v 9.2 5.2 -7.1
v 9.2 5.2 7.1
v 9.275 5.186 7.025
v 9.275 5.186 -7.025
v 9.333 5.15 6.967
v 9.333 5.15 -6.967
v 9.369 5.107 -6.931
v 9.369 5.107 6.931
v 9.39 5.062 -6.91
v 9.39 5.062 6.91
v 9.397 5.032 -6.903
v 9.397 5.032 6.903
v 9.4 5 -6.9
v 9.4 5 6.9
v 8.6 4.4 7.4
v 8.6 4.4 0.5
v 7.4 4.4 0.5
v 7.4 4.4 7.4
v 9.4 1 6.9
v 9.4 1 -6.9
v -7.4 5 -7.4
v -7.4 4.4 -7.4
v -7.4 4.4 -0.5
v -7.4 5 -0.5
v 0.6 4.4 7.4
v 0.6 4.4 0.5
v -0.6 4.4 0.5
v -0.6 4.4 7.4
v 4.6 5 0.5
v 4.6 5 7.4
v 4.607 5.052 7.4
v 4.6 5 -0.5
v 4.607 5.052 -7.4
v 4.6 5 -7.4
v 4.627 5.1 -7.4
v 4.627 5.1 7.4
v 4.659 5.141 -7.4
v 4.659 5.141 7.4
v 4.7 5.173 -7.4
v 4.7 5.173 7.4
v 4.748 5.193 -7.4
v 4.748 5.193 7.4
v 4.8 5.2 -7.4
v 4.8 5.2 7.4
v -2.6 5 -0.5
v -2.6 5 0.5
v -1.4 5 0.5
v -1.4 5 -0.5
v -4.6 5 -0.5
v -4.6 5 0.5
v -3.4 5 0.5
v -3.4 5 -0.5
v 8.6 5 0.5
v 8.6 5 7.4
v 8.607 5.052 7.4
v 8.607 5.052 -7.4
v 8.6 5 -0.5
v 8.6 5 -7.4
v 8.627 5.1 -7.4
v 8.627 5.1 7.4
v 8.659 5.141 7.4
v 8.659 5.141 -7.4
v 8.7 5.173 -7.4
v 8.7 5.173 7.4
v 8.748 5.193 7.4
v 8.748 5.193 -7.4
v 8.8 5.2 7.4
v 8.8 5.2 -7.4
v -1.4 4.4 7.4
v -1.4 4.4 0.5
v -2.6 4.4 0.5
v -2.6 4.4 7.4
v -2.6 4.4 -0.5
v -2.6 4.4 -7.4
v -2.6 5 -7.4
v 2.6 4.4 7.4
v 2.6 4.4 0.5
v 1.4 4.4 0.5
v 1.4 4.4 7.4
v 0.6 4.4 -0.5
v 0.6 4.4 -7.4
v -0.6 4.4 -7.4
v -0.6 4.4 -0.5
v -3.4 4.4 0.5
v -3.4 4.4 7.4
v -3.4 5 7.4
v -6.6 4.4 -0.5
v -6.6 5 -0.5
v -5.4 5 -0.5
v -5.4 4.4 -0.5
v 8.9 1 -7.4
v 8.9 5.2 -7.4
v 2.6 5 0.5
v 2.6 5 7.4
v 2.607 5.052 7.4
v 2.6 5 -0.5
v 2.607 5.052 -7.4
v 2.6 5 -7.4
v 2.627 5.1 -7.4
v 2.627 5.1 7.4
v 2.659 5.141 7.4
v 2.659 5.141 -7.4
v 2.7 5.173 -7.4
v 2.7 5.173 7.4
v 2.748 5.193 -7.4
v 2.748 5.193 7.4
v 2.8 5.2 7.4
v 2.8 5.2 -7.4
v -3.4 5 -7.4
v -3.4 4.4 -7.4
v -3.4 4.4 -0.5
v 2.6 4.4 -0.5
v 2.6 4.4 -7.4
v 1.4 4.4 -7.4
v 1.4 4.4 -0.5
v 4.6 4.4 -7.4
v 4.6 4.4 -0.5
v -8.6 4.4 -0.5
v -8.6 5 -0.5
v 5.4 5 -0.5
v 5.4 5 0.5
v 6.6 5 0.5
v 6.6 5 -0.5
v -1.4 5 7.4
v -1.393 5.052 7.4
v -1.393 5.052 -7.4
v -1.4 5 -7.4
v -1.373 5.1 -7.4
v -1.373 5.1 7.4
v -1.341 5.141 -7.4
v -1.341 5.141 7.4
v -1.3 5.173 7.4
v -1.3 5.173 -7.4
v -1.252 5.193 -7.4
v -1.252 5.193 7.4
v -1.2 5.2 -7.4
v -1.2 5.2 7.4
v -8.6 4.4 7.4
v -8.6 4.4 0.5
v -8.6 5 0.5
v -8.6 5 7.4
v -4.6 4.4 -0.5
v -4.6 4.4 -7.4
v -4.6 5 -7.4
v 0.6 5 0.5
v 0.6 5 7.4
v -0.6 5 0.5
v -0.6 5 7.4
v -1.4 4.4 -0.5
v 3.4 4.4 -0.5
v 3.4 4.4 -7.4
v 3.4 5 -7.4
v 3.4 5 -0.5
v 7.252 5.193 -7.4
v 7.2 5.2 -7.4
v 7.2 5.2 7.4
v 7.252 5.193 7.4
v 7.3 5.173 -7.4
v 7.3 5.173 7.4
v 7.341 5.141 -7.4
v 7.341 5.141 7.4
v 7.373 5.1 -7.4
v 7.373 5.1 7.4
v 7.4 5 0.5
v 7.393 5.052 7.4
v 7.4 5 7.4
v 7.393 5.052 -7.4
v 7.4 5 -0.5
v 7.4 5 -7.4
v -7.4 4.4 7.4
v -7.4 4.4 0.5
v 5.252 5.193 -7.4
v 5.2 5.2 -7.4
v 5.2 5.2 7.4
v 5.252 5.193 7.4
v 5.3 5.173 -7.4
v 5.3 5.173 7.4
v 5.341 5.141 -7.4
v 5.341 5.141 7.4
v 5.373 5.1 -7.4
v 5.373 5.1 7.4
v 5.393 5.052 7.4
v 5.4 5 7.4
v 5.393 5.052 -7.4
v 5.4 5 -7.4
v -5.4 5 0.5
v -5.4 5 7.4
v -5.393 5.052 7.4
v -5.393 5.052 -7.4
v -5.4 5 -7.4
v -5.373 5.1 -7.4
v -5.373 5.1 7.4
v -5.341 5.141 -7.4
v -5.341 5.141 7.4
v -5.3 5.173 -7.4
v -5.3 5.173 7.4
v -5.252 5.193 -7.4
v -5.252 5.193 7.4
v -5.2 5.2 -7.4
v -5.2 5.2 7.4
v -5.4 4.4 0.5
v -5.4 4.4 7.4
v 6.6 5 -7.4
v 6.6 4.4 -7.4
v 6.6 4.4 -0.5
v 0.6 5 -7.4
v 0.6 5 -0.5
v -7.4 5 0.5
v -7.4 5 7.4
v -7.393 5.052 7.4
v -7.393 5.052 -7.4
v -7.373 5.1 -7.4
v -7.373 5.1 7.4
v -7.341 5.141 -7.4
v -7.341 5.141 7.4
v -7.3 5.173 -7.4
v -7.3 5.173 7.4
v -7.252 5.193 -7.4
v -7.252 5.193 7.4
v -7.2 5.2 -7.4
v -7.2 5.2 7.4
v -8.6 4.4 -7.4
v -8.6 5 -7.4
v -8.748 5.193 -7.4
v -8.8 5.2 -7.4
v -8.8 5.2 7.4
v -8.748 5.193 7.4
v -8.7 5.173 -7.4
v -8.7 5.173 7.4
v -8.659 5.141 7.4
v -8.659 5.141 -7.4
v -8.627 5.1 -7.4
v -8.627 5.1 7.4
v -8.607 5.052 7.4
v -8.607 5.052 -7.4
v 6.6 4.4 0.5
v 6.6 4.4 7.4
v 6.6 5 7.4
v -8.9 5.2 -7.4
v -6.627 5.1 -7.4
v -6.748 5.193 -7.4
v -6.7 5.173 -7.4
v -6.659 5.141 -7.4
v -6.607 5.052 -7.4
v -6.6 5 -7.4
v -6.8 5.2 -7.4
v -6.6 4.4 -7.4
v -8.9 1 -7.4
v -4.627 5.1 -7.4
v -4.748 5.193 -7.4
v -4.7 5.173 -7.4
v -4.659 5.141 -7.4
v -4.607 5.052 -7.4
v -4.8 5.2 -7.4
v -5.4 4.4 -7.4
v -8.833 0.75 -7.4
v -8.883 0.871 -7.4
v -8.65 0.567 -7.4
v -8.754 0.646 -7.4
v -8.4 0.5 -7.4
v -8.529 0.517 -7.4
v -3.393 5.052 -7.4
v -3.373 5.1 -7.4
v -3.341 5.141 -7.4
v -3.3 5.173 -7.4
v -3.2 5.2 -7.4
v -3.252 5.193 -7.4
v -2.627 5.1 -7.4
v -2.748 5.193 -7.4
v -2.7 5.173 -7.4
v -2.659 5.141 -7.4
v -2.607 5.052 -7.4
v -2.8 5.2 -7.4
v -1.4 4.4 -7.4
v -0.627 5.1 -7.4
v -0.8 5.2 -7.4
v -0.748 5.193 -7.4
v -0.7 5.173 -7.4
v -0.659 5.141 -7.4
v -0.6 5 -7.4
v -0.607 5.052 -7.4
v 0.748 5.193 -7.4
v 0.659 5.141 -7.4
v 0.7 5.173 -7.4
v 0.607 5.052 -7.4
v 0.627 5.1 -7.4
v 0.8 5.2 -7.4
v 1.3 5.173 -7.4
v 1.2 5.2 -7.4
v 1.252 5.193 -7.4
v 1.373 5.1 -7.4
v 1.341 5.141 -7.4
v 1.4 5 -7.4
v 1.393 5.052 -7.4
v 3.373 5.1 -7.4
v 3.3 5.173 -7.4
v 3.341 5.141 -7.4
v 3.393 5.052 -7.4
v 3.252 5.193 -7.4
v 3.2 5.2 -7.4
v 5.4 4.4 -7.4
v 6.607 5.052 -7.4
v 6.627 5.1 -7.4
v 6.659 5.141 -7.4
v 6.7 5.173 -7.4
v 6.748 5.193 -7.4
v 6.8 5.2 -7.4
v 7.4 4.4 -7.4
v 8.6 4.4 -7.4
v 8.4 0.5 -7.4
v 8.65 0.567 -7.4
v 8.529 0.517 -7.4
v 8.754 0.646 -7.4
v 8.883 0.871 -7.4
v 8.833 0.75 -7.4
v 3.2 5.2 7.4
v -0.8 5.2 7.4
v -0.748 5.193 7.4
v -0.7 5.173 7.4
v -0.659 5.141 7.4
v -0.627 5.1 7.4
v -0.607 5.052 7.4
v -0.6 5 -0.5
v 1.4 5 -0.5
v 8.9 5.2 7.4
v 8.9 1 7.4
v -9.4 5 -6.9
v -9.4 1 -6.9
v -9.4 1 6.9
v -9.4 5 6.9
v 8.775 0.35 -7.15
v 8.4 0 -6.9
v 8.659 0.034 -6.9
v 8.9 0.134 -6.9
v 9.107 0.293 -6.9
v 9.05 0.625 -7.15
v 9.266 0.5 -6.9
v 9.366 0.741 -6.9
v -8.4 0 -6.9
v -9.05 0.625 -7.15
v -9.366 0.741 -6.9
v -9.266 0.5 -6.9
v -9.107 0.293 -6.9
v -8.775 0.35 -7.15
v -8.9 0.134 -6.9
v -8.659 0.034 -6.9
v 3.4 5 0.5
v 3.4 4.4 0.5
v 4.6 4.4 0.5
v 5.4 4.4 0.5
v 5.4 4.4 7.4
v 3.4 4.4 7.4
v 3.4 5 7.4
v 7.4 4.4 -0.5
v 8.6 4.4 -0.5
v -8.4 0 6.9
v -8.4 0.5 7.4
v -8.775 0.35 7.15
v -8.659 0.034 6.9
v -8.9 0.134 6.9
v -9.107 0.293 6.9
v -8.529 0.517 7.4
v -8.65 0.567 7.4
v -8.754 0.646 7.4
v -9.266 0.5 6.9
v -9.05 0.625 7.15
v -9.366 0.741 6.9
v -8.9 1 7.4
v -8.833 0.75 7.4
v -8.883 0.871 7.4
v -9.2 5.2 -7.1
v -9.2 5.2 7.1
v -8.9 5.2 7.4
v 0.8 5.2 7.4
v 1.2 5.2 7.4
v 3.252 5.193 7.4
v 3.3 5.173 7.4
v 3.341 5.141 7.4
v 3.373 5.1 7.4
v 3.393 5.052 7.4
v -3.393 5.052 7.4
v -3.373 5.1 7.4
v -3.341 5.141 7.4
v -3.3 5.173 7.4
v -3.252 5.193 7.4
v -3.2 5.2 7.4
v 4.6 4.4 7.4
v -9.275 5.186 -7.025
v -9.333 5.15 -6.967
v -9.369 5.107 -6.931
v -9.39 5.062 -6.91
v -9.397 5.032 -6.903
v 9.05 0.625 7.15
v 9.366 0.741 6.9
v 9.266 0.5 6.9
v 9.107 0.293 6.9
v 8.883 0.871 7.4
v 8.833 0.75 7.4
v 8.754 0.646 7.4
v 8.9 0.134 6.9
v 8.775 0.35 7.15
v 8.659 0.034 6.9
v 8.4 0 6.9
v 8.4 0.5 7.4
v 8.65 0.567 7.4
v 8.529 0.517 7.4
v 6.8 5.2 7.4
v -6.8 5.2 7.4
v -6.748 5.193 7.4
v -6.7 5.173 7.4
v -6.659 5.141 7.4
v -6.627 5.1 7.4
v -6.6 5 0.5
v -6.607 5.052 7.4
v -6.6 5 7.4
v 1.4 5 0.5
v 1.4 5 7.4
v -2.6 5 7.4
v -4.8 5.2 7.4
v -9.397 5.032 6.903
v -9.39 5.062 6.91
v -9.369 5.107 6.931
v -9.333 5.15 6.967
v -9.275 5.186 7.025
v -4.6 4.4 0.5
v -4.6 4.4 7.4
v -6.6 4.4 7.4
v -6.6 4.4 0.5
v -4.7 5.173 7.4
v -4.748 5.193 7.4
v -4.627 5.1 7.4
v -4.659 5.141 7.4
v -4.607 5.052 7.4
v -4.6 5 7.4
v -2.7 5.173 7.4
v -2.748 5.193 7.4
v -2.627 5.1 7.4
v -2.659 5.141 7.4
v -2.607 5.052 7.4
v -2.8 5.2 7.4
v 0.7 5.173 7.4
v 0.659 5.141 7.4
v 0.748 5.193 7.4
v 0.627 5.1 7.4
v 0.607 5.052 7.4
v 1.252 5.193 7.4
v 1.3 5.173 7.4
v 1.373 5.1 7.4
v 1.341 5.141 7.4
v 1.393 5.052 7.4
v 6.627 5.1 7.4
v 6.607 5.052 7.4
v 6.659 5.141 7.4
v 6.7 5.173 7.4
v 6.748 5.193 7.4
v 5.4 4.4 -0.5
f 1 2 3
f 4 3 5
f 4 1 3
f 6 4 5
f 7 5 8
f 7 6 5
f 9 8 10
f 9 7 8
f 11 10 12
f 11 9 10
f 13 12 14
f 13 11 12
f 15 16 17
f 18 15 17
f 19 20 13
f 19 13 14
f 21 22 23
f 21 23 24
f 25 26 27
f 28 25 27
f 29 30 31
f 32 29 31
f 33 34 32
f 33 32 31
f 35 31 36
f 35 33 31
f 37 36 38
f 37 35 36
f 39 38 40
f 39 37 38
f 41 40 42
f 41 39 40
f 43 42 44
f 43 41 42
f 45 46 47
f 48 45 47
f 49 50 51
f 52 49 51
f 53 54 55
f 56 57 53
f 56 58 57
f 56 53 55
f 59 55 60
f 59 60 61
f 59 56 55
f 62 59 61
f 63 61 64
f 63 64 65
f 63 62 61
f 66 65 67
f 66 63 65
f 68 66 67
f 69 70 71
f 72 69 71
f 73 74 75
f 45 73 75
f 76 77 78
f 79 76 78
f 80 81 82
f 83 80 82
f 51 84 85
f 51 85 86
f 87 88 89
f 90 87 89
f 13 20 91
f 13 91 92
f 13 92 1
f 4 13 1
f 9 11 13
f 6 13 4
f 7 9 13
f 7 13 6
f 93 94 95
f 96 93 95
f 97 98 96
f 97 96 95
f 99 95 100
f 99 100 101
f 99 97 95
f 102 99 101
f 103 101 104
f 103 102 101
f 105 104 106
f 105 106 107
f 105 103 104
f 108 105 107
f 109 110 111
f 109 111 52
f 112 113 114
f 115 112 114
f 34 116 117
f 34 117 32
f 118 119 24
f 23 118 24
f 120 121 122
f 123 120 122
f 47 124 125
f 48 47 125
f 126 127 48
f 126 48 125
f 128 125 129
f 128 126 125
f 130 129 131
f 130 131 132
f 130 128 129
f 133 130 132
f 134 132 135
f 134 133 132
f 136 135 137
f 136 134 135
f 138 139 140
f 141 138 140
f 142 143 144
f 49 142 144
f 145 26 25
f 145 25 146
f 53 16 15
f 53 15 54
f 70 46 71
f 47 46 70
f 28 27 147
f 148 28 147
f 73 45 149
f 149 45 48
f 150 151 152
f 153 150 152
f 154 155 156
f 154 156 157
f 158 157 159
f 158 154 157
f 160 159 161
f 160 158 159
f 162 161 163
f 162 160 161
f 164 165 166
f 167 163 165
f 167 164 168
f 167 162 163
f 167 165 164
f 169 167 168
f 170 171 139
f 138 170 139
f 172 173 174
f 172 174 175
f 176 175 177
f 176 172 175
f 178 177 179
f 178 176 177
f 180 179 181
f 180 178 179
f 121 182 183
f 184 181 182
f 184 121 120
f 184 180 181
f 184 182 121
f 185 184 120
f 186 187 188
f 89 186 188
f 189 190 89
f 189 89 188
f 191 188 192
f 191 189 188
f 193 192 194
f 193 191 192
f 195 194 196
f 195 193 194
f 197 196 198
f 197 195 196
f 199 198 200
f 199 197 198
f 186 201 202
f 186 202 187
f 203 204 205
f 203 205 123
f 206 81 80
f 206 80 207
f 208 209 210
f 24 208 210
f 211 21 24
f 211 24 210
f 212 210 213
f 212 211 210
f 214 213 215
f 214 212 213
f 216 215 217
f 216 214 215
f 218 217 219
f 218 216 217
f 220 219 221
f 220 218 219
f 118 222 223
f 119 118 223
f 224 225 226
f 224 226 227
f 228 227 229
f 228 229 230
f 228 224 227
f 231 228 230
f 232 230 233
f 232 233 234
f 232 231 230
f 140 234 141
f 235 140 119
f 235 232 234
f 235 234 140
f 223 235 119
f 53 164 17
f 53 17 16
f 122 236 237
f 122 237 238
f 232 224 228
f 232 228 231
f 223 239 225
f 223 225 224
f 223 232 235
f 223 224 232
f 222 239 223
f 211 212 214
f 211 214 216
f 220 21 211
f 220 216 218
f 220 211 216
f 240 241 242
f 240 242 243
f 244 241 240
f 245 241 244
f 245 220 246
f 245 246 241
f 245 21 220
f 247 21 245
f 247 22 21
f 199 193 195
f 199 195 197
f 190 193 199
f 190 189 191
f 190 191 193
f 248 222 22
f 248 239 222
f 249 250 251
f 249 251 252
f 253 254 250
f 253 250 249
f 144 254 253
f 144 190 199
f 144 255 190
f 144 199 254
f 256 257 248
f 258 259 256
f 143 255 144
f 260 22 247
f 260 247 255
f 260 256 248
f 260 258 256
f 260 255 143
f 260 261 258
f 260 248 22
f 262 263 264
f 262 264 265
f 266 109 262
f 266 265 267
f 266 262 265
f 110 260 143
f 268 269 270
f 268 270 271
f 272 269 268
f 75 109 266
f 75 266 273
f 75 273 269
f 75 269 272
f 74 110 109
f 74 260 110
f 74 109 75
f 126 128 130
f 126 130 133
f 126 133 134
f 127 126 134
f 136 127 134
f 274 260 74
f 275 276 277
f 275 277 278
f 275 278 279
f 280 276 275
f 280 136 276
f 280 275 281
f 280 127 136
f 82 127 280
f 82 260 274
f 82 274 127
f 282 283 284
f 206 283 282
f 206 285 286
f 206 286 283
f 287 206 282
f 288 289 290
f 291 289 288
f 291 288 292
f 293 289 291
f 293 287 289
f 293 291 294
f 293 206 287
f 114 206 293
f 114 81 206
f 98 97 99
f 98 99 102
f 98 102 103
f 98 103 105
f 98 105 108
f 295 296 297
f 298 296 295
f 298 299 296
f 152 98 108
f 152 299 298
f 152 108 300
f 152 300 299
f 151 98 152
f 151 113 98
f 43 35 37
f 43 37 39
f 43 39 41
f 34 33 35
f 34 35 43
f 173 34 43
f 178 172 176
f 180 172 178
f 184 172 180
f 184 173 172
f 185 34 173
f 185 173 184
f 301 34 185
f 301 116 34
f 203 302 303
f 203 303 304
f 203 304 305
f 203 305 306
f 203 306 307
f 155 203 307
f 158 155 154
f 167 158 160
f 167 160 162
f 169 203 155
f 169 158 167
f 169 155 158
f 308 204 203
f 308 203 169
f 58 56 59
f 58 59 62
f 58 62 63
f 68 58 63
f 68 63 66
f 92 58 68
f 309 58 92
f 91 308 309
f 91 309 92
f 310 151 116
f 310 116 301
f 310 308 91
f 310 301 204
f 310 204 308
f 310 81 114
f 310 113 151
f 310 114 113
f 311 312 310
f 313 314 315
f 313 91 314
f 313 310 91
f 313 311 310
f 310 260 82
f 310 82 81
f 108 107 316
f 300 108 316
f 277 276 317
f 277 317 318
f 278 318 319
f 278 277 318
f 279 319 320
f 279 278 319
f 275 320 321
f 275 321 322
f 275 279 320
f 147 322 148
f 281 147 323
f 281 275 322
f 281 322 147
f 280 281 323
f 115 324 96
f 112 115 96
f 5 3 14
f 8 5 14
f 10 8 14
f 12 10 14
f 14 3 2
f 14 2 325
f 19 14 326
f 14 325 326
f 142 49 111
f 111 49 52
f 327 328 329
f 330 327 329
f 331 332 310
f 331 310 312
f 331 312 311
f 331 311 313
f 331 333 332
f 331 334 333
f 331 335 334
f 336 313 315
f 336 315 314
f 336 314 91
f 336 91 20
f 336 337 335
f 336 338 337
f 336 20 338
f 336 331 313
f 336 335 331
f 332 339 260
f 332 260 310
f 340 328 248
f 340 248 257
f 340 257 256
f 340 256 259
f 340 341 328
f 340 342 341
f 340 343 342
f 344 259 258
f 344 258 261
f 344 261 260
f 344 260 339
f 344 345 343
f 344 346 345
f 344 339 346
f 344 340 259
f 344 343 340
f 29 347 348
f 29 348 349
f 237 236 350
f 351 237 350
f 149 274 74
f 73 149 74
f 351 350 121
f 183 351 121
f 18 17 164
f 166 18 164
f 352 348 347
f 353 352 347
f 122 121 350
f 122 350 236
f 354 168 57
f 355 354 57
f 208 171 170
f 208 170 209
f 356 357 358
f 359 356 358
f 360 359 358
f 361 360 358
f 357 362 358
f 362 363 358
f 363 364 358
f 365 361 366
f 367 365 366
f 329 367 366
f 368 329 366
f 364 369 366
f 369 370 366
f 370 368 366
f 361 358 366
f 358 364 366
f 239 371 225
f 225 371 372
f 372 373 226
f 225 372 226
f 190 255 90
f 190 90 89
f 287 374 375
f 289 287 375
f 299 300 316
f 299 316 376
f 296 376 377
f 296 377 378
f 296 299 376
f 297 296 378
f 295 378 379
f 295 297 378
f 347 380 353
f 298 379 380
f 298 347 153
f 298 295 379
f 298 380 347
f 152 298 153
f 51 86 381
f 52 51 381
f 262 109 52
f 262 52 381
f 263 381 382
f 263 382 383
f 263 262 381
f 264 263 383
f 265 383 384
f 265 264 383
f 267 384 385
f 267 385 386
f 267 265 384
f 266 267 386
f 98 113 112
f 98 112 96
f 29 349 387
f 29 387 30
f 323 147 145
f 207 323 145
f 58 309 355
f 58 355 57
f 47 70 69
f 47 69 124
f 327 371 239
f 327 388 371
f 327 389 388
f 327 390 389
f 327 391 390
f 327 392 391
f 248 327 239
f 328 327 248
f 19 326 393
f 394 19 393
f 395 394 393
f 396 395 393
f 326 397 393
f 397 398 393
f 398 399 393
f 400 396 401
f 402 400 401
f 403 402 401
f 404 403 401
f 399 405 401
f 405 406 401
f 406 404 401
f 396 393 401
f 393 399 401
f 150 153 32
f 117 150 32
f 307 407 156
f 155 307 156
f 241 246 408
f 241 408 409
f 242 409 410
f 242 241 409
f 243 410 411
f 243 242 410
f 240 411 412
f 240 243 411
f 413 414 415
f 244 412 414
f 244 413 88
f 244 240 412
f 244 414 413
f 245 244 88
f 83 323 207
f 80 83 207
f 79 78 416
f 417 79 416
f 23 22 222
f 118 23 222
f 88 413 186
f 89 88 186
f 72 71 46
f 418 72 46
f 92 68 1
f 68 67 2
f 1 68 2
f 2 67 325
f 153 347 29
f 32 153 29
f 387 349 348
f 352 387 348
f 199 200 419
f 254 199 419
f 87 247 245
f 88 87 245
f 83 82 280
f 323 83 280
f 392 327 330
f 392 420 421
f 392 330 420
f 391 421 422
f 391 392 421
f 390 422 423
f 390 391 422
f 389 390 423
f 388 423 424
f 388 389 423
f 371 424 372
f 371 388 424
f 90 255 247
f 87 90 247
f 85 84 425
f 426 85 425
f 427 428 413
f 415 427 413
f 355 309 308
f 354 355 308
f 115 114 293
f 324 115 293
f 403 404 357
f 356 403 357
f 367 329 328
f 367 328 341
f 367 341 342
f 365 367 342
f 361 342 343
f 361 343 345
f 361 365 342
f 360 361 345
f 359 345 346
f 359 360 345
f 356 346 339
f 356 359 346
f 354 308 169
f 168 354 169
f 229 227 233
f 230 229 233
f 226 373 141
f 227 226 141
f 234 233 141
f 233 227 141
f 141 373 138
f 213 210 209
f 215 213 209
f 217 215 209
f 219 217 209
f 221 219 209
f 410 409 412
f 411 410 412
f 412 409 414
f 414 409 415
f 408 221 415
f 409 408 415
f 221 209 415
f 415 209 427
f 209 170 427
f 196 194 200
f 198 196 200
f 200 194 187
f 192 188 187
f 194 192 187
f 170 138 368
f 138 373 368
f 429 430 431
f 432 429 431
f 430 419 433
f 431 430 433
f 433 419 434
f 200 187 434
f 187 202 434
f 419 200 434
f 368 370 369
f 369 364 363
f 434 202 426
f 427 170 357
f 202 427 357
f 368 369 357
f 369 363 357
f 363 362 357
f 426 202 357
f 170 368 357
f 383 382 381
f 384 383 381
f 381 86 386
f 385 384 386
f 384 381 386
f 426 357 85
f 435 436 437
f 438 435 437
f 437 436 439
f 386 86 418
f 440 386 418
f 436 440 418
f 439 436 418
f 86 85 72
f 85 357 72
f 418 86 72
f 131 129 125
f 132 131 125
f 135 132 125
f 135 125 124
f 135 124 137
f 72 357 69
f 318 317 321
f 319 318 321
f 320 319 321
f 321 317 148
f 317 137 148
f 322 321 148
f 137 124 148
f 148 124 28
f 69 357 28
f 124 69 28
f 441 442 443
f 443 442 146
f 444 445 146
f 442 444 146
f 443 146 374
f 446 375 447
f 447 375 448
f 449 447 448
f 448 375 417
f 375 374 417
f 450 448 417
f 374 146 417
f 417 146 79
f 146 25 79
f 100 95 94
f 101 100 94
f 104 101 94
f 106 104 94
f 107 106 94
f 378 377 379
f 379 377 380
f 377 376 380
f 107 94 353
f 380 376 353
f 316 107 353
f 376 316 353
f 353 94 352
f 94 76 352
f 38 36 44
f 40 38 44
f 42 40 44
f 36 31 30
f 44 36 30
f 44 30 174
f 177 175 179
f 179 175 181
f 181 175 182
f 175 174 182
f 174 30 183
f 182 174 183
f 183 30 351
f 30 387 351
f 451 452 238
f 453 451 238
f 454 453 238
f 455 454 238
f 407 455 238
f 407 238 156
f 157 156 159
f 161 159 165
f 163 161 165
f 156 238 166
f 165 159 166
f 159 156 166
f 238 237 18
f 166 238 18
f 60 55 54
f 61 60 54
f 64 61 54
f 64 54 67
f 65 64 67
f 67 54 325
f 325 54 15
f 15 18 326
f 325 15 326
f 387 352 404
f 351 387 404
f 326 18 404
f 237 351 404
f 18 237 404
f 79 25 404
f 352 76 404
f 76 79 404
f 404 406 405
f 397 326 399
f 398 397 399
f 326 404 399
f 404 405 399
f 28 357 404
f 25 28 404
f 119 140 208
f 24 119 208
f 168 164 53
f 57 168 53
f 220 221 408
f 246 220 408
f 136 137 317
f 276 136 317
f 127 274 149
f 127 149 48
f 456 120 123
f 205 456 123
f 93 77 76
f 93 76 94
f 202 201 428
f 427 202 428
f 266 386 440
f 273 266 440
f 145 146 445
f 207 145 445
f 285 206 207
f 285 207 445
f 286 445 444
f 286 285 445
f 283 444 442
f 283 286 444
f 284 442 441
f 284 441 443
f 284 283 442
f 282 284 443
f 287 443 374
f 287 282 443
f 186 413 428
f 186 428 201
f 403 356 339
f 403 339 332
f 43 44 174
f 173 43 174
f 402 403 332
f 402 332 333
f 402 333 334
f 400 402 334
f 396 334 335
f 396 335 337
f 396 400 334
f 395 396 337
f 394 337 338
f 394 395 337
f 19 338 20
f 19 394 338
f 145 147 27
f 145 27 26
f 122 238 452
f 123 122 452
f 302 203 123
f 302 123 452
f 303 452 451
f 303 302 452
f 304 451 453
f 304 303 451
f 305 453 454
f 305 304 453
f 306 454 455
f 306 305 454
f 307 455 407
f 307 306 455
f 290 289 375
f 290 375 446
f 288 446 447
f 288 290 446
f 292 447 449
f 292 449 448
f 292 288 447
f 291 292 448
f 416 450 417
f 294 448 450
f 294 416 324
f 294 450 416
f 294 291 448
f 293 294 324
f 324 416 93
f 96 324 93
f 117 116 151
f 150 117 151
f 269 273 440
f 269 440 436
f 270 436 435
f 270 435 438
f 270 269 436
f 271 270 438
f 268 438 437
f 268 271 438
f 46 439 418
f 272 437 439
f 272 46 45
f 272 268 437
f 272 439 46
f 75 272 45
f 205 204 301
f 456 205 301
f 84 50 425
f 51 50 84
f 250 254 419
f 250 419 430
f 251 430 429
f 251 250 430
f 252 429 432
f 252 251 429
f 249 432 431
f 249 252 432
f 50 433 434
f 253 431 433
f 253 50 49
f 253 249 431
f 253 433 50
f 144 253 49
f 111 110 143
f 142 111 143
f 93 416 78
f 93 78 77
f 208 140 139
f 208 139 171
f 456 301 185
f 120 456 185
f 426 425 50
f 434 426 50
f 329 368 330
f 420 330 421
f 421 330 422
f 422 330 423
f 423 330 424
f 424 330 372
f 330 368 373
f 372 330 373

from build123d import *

# Parameters (mm, degrees)
SKETCH1_W           = 18.8
SKETCH1_H           = 14.8
BOSS_EXTRUDE1_DEPTH = 5.2
SKETCH2_W           = 1.2
SKETCH2_H           = 0.8
CUT_EXTRUDE1_DEPTH  = 19.287700785
SKETCH3_W           = 1.2
SKETCH3_H           = 0.8
CUT_EXTRUDE2_DEPTH  = 19.287700785
SKETCH4_W           = 1.2
SKETCH4_H           = 0.8
CUT_EXTRUDE3_DEPTH  = 19.287700785
SKETCH5_W           = 1.2
SKETCH5_H           = 0.8
CUT_EXTRUDE4_DEPTH  = 19.287700785
SKETCH6_W           = 1.2
SKETCH6_H           = 0.8
CUT_EXTRUDE5_DEPTH  = 19.287700785
SKETCH7_W           = 1.2
SKETCH7_H           = 0.8
CUT_EXTRUDE6_DEPTH  = 19.287700785
SKETCH8_W           = 1.2
SKETCH8_H           = 0.8
CUT_EXTRUDE7_DEPTH  = 19.287700785
SKETCH9_W           = 1.2
SKETCH9_H           = 0.8
CUT_EXTRUDE8_DEPTH  = 19.287700785
SKETCH10_W          = 1.2
SKETCH10_H          = 0.8
CUT_EXTRUDE9_DEPTH  = 19.287700785
RIB1_REACH          = 15.045
SKETCH11_WALL_W     = 29.289078174
SKETCH11_WALL_H     = 1
RIB2_REACH          = 15.045
SKETCH12_WALL_W     = 29.289078174
SKETCH12_WALL_H     = 1
RIB3_REACH          = 15.045
SKETCH13_WALL_W     = 29.289078174
SKETCH13_WALL_H     = 1
RIB4_REACH          = 15.045
SKETCH14_WALL_W     = 29.289078174
SKETCH14_WALL_H     = 1
RIB5_REACH          = 15.045
SKETCH15_WALL_W     = 29.289078174
SKETCH15_WALL_H     = 1
RIB6_REACH          = 15.045
SKETCH16_WALL_W     = 29.289078174
SKETCH16_WALL_H     = 1
RIB7_REACH          = 15.045
SKETCH17_WALL_W     = 29.289078174
SKETCH17_WALL_H     = 1
RIB8_REACH          = 15.045
SKETCH18_WALL_W     = 29.289078174
SKETCH18_WALL_H     = 1
RIB9_REACH          = 15.045
SKETCH19_WALL_W     = 29.289078174
SKETCH19_WALL_H     = 1
FILLET1_R           = 1
CHAMFER1_SIZE       = 0.5
FILLET2_START       = -8
FILLET2_DEPTH       = 16


with BuildPart() as part:
    # Sketch1 → Boss-Extrude1 (new body)
    with BuildSketch(Plane.XZ):
        Rectangle(SKETCH1_W, SKETCH1_H)
    extrude(amount=-BOSS_EXTRUDE1_DEPTH)

    # Sketch2 → Cut-Extrude1 (cut, through all)
    with BuildSketch(Plane(origin=(0, 0, -7.4), x_dir=(-1, 0, 0), z_dir=(0, 0, -1))):
        with Locations((-8, 4.8)):
            Rectangle(SKETCH2_W, SKETCH2_H)
    extrude(amount=-CUT_EXTRUDE1_DEPTH, mode=Mode.SUBTRACT)

    # Sketch3 → Cut-Extrude2 (cut, through all)
    with BuildSketch(Plane(origin=(0, 0, -7.4), x_dir=(-1, 0, 0), z_dir=(0, 0, -1))):
        with Locations((-6, 4.8)):
            Rectangle(SKETCH3_W, SKETCH3_H)
    extrude(amount=-CUT_EXTRUDE2_DEPTH, mode=Mode.SUBTRACT)

    # Sketch4 → Cut-Extrude3 (cut, through all)
    with BuildSketch(Plane(origin=(0, 0, -7.4), x_dir=(-1, 0, 0), z_dir=(0, 0, -1))):
        with Locations((-4, 4.8)):
            Rectangle(SKETCH4_W, SKETCH4_H)
    extrude(amount=-CUT_EXTRUDE3_DEPTH, mode=Mode.SUBTRACT)

    # Sketch5 → Cut-Extrude4 (cut, through all)
    with BuildSketch(Plane(origin=(0, 0, -7.4), x_dir=(-1, 0, 0), z_dir=(0, 0, -1))):
        with Locations((-2, 4.8)):
            Rectangle(SKETCH5_W, SKETCH5_H)
    extrude(amount=-CUT_EXTRUDE4_DEPTH, mode=Mode.SUBTRACT)

    # Sketch6 → Cut-Extrude5 (cut, through all)
    with BuildSketch(Plane(origin=(0, 0, -7.4), x_dir=(-1, 0, 0), z_dir=(0, 0, -1))):
        with Locations((0, 4.8)):
            Rectangle(SKETCH6_W, SKETCH6_H)
    extrude(amount=-CUT_EXTRUDE5_DEPTH, mode=Mode.SUBTRACT)

    # Sketch7 → Cut-Extrude6 (cut, through all)
    with BuildSketch(Plane(origin=(0, 0, -7.4), x_dir=(-1, 0, 0), z_dir=(0, 0, -1))):
        with Locations((2, 4.8)):
            Rectangle(SKETCH7_W, SKETCH7_H)
    extrude(amount=-CUT_EXTRUDE6_DEPTH, mode=Mode.SUBTRACT)

    # Sketch8 → Cut-Extrude7 (cut, through all)
    with BuildSketch(Plane(origin=(0, 0, -7.4), x_dir=(-1, 0, 0), z_dir=(0, 0, -1))):
        with Locations((4, 4.8)):
            Rectangle(SKETCH8_W, SKETCH8_H)
    extrude(amount=-CUT_EXTRUDE7_DEPTH, mode=Mode.SUBTRACT)

    # Sketch9 → Cut-Extrude8 (cut, through all)
    with BuildSketch(Plane(origin=(0, 0, -7.4), x_dir=(-1, 0, 0), z_dir=(0, 0, -1))):
        with Locations((6, 4.8)):
            Rectangle(SKETCH9_W, SKETCH9_H)
    extrude(amount=-CUT_EXTRUDE8_DEPTH, mode=Mode.SUBTRACT)

    # Sketch10 → Cut-Extrude9 (cut, through all)
    with BuildSketch(Plane(origin=(0, 0, -7.4), x_dir=(-1, 0, 0), z_dir=(0, 0, -1))):
        with Locations((8, 4.8)):
            Rectangle(SKETCH10_W, SKETCH10_H)
    extrude(amount=-CUT_EXTRUDE9_DEPTH, mode=Mode.SUBTRACT)

    # Sketch11 wall → Rib1 (add, up to next)
    with BuildSketch(Plane(origin=(4, 5, 0), x_dir=(1, 0, 0), z_dir=(0, -1, 0)), mode=Mode.PRIVATE) as rib1_sk1:
        Rectangle(SKETCH11_WALL_W, SKETCH11_WALL_H)
    rib1_tool1 = extrude(rib1_sk1.sketch, amount=RIB1_REACH, mode=Mode.PRIVATE) - part.part
    add(rib1_tool1.solids().sort_by_distance((4, 5, 0))[0])

    # Sketch12 wall → Rib2 (add, up to next)
    with BuildSketch(Plane(origin=(-4, 5, 0), x_dir=(1, 0, 0), z_dir=(0, -1, 0)), mode=Mode.PRIVATE) as rib2_sk1:
        Rectangle(SKETCH12_WALL_W, SKETCH12_WALL_H)
    rib2_tool1 = extrude(rib2_sk1.sketch, amount=RIB2_REACH, mode=Mode.PRIVATE) - part.part
    add(rib2_tool1.solids().sort_by_distance((-4, 5, 0))[0])

    # Sketch13 wall → Rib3 (add, up to next)
    with BuildSketch(Plane(origin=(-8, 5, 0), x_dir=(1, 0, 0), z_dir=(0, -1, 0)), mode=Mode.PRIVATE) as rib3_sk1:
        Rectangle(SKETCH13_WALL_W, SKETCH13_WALL_H)
    rib3_tool1 = extrude(rib3_sk1.sketch, amount=RIB3_REACH, mode=Mode.PRIVATE) - part.part
    add(rib3_tool1.solids().sort_by_distance((-8, 5, 0))[0])

    # Sketch14 wall → Rib4 (add, up to next)
    with BuildSketch(Plane(origin=(8, 5, 0), x_dir=(1, 0, 0), z_dir=(0, -1, 0)), mode=Mode.PRIVATE) as rib4_sk1:
        Rectangle(SKETCH14_WALL_W, SKETCH14_WALL_H)
    rib4_tool1 = extrude(rib4_sk1.sketch, amount=RIB4_REACH, mode=Mode.PRIVATE) - part.part
    add(rib4_tool1.solids().sort_by_distance((8, 5, 0))[0])

    # Sketch15 wall → Rib5 (add, up to next)
    with BuildSketch(Plane(origin=(2, 5, 0), x_dir=(1, 0, 0), z_dir=(0, -1, 0)), mode=Mode.PRIVATE) as rib5_sk1:
        Rectangle(SKETCH15_WALL_W, SKETCH15_WALL_H)
    rib5_tool1 = extrude(rib5_sk1.sketch, amount=RIB5_REACH, mode=Mode.PRIVATE) - part.part
    add(rib5_tool1.solids().sort_by_distance((2, 5, 0))[0])

    # Sketch16 wall → Rib6 (add, up to next)
    with BuildSketch(Plane(origin=(-2, 5, 0), x_dir=(1, 0, 0), z_dir=(0, -1, 0)), mode=Mode.PRIVATE) as rib6_sk1:
        Rectangle(SKETCH16_WALL_W, SKETCH16_WALL_H)
    rib6_tool1 = extrude(rib6_sk1.sketch, amount=RIB6_REACH, mode=Mode.PRIVATE) - part.part
    add(rib6_tool1.solids().sort_by_distance((-2, 5, 0))[0])

    # Sketch17 wall → Rib7 (add, up to next)
    with BuildSketch(Plane(origin=(6, 5, 0), x_dir=(1, 0, 0), z_dir=(0, -1, 0)), mode=Mode.PRIVATE) as rib7_sk1:
        Rectangle(SKETCH17_WALL_W, SKETCH17_WALL_H)
    rib7_tool1 = extrude(rib7_sk1.sketch, amount=RIB7_REACH, mode=Mode.PRIVATE) - part.part
    add(rib7_tool1.solids().sort_by_distance((6, 5, 0))[0])

    # Sketch18 wall → Rib8 (add, up to next)
    with BuildSketch(Plane.XZ.offset(-5), mode=Mode.PRIVATE) as rib8_sk1:
        Rectangle(SKETCH18_WALL_W, SKETCH18_WALL_H)
    rib8_tool1 = extrude(rib8_sk1.sketch, amount=RIB8_REACH, mode=Mode.PRIVATE) - part.part
    add(rib8_tool1.solids().sort_by_distance((0, 5, 0))[0])

    # Sketch19 wall → Rib9 (add, up to next)
    with BuildSketch(Plane(origin=(-6, 5, 0), x_dir=(1, 0, 0), z_dir=(0, -1, 0)), mode=Mode.PRIVATE) as rib9_sk1:
        Rectangle(SKETCH19_WALL_W, SKETCH19_WALL_H)
    rib9_tool1 = extrude(rib9_sk1.sketch, amount=RIB9_REACH, mode=Mode.PRIVATE) - part.part
    add(rib9_tool1.solids().sort_by_distance((-6, 5, 0))[0])

    # Fillet1
    fillet1_edges = [part.edges().sort_by_distance(p)[0] for p in [
        (9.4, 0, 0),
        (-9.4, 0, 0),
    ]]
    fillet(fillet1_edges, radius=FILLET1_R)

    # Chamfer1
    chamfer1_edges = [part.edges().sort_by_distance(p)[0] for p in [
        (-9.4, 3.1, 7.4),
        (9.4, 3.1, 7.4),
        (9.4, 3.1, -7.4),
        (-9.4, 3.1, -7.4),
        (0, 0, -7.4),
        (0, 0, 7.4),
        (-9.107106781, 0.292893219, 7.4),
        (9.107106781, 0.292893219, 7.4),
        (-9.107106781, 0.292893219, -7.4),
        (9.107106781, 0.292893219, -7.4),
    ]]
    chamfer(chamfer1_edges, length=CHAMFER1_SIZE)

    # Fillet2: read off the stored shape, not the designer's step
    # Fillet2 outline → Fillet2 (cut)
    with BuildSketch(Plane.XY.offset(FILLET2_START)):
        with BuildLine():
            Line((7.4, 5.2), (7.2, 5.2))
            ThreePointArc((7.2, 5.2), (7.341421356, 5.141421356), (7.4, 5))
            Line((7.4, 5), (7.4, 5.2))
        make_face()
        with BuildLine():
            ThreePointArc((6.6, 5), (6.658578644, 5.141421356), (6.8, 5.2))
            Line((6.8, 5.2), (6.6, 5.2))
            Line((6.6, 5.2), (6.6, 5))
        make_face()
        with BuildLine():
            Line((3.4, 5.2), (3.2, 5.2))
            ThreePointArc((3.2, 5.2), (3.341421356, 5.141421356), (3.4, 5))
            Line((3.4, 5), (3.4, 5.2))
        make_face()
        with BuildLine():
            ThreePointArc((2.6, 5), (2.658578644, 5.141421356), (2.8, 5.2))
            Line((2.8, 5.2), (2.6, 5.2))
            Line((2.6, 5.2), (2.6, 5))
        make_face()
        with BuildLine():
            Line((1.4, 5.2), (1.2, 5.2))
            ThreePointArc((1.2, 5.2), (1.341421356, 5.141421356), (1.4, 5))
            Line((1.4, 5), (1.4, 5.2))
        make_face()
        with BuildLine():
            ThreePointArc((0.6, 5), (0.658578644, 5.141421356), (0.8, 5.2))
            Line((0.8, 5.2), (0.6, 5.2))
            Line((0.6, 5.2), (0.6, 5))
        make_face()
        with BuildLine():
            Line((-7.4, 5.2), (-7.4, 5))
            ThreePointArc((-7.4, 5), (-7.341421356, 5.141421356), (-7.2, 5.2))
            Line((-7.2, 5.2), (-7.4, 5.2))
        make_face()
        with BuildLine():
            Line((-6.6, 5.2), (-6.8, 5.2))
            ThreePointArc((-6.8, 5.2), (-6.658578644, 5.141421356), (-6.6, 5))
            Line((-6.6, 5), (-6.6, 5.2))
        make_face()
        with BuildLine():
            Line((5.4, 5.2), (5.2, 5.2))
            ThreePointArc((5.2, 5.2), (5.341421356, 5.141421356), (5.4, 5))
            Line((5.4, 5), (5.4, 5.2))
        make_face()
        with BuildLine():
            ThreePointArc((4.6, 5), (4.658578644, 5.141421356), (4.8, 5.2))
            Line((4.8, 5.2), (4.6, 5.2))
            Line((4.6, 5.2), (4.6, 5))
        make_face()
        with BuildLine():
            Line((-8.6, 5.2), (-8.8, 5.2))
            ThreePointArc((-8.8, 5.2), (-8.658578644, 5.141421356), (-8.6, 5))
            Line((-8.6, 5), (-8.6, 5.2))
        make_face()
        with BuildLine():
            ThreePointArc((-9.4, 5), (-9.341421356, 5.141421356), (-9.2, 5.2))
            Line((-9.2, 5.2), (-9.4, 5.2))
            Line((-9.4, 5.2), (-9.4, 5))
        make_face()
        with BuildLine():
            Line((-5.4, 5.2), (-5.4, 5))
            ThreePointArc((-5.4, 5), (-5.341421356, 5.141421356), (-5.2, 5.2))
            Line((-5.2, 5.2), (-5.4, 5.2))
        make_face()
        with BuildLine():
            Line((-4.6, 5.2), (-4.8, 5.2))
            ThreePointArc((-4.8, 5.2), (-4.658578644, 5.141421356), (-4.6, 5))
            Line((-4.6, 5), (-4.6, 5.2))
        make_face()
        with BuildLine():
            Line((-3.4, 5.2), (-3.4, 5))
            ThreePointArc((-3.4, 5), (-3.341421356, 5.141421356), (-3.2, 5.2))
            Line((-3.2, 5.2), (-3.4, 5.2))
        make_face()
        with BuildLine():
            Line((-2.6, 5.2), (-2.8, 5.2))
            ThreePointArc((-2.8, 5.2), (-2.658578644, 5.141421356), (-2.6, 5))
            Line((-2.6, 5), (-2.6, 5.2))
        make_face()
        with BuildLine():
            Line((-1.4, 5.2), (-1.4, 5))
            ThreePointArc((-1.4, 5), (-1.341421356, 5.141421356), (-1.2, 5.2))
            Line((-1.2, 5.2), (-1.4, 5.2))
        make_face()
        with BuildLine():
            Line((-0.6, 5.2), (-0.8, 5.2))
            ThreePointArc((-0.8, 5.2), (-0.658578644, 5.141421356), (-0.6, 5))
            Line((-0.6, 5), (-0.6, 5.2))
        make_face()
        with BuildLine():
            Line((8.6, 5.2), (8.6, 5))
            ThreePointArc((8.6, 5), (8.658578644, 5.141421356), (8.8, 5.2))
            Line((8.8, 5.2), (8.6, 5.2))
        make_face()
        with BuildLine():
            Line((9.4, 5.2), (9.2, 5.2))
            ThreePointArc((9.2, 5.2), (9.341421356, 5.141421356), (9.4, 5))
            Line((9.4, 5), (9.4, 5.2))
        make_face()
    extrude(amount=FILLET2_DEPTH, mode=Mode.SUBTRACT)


solid = part.part
